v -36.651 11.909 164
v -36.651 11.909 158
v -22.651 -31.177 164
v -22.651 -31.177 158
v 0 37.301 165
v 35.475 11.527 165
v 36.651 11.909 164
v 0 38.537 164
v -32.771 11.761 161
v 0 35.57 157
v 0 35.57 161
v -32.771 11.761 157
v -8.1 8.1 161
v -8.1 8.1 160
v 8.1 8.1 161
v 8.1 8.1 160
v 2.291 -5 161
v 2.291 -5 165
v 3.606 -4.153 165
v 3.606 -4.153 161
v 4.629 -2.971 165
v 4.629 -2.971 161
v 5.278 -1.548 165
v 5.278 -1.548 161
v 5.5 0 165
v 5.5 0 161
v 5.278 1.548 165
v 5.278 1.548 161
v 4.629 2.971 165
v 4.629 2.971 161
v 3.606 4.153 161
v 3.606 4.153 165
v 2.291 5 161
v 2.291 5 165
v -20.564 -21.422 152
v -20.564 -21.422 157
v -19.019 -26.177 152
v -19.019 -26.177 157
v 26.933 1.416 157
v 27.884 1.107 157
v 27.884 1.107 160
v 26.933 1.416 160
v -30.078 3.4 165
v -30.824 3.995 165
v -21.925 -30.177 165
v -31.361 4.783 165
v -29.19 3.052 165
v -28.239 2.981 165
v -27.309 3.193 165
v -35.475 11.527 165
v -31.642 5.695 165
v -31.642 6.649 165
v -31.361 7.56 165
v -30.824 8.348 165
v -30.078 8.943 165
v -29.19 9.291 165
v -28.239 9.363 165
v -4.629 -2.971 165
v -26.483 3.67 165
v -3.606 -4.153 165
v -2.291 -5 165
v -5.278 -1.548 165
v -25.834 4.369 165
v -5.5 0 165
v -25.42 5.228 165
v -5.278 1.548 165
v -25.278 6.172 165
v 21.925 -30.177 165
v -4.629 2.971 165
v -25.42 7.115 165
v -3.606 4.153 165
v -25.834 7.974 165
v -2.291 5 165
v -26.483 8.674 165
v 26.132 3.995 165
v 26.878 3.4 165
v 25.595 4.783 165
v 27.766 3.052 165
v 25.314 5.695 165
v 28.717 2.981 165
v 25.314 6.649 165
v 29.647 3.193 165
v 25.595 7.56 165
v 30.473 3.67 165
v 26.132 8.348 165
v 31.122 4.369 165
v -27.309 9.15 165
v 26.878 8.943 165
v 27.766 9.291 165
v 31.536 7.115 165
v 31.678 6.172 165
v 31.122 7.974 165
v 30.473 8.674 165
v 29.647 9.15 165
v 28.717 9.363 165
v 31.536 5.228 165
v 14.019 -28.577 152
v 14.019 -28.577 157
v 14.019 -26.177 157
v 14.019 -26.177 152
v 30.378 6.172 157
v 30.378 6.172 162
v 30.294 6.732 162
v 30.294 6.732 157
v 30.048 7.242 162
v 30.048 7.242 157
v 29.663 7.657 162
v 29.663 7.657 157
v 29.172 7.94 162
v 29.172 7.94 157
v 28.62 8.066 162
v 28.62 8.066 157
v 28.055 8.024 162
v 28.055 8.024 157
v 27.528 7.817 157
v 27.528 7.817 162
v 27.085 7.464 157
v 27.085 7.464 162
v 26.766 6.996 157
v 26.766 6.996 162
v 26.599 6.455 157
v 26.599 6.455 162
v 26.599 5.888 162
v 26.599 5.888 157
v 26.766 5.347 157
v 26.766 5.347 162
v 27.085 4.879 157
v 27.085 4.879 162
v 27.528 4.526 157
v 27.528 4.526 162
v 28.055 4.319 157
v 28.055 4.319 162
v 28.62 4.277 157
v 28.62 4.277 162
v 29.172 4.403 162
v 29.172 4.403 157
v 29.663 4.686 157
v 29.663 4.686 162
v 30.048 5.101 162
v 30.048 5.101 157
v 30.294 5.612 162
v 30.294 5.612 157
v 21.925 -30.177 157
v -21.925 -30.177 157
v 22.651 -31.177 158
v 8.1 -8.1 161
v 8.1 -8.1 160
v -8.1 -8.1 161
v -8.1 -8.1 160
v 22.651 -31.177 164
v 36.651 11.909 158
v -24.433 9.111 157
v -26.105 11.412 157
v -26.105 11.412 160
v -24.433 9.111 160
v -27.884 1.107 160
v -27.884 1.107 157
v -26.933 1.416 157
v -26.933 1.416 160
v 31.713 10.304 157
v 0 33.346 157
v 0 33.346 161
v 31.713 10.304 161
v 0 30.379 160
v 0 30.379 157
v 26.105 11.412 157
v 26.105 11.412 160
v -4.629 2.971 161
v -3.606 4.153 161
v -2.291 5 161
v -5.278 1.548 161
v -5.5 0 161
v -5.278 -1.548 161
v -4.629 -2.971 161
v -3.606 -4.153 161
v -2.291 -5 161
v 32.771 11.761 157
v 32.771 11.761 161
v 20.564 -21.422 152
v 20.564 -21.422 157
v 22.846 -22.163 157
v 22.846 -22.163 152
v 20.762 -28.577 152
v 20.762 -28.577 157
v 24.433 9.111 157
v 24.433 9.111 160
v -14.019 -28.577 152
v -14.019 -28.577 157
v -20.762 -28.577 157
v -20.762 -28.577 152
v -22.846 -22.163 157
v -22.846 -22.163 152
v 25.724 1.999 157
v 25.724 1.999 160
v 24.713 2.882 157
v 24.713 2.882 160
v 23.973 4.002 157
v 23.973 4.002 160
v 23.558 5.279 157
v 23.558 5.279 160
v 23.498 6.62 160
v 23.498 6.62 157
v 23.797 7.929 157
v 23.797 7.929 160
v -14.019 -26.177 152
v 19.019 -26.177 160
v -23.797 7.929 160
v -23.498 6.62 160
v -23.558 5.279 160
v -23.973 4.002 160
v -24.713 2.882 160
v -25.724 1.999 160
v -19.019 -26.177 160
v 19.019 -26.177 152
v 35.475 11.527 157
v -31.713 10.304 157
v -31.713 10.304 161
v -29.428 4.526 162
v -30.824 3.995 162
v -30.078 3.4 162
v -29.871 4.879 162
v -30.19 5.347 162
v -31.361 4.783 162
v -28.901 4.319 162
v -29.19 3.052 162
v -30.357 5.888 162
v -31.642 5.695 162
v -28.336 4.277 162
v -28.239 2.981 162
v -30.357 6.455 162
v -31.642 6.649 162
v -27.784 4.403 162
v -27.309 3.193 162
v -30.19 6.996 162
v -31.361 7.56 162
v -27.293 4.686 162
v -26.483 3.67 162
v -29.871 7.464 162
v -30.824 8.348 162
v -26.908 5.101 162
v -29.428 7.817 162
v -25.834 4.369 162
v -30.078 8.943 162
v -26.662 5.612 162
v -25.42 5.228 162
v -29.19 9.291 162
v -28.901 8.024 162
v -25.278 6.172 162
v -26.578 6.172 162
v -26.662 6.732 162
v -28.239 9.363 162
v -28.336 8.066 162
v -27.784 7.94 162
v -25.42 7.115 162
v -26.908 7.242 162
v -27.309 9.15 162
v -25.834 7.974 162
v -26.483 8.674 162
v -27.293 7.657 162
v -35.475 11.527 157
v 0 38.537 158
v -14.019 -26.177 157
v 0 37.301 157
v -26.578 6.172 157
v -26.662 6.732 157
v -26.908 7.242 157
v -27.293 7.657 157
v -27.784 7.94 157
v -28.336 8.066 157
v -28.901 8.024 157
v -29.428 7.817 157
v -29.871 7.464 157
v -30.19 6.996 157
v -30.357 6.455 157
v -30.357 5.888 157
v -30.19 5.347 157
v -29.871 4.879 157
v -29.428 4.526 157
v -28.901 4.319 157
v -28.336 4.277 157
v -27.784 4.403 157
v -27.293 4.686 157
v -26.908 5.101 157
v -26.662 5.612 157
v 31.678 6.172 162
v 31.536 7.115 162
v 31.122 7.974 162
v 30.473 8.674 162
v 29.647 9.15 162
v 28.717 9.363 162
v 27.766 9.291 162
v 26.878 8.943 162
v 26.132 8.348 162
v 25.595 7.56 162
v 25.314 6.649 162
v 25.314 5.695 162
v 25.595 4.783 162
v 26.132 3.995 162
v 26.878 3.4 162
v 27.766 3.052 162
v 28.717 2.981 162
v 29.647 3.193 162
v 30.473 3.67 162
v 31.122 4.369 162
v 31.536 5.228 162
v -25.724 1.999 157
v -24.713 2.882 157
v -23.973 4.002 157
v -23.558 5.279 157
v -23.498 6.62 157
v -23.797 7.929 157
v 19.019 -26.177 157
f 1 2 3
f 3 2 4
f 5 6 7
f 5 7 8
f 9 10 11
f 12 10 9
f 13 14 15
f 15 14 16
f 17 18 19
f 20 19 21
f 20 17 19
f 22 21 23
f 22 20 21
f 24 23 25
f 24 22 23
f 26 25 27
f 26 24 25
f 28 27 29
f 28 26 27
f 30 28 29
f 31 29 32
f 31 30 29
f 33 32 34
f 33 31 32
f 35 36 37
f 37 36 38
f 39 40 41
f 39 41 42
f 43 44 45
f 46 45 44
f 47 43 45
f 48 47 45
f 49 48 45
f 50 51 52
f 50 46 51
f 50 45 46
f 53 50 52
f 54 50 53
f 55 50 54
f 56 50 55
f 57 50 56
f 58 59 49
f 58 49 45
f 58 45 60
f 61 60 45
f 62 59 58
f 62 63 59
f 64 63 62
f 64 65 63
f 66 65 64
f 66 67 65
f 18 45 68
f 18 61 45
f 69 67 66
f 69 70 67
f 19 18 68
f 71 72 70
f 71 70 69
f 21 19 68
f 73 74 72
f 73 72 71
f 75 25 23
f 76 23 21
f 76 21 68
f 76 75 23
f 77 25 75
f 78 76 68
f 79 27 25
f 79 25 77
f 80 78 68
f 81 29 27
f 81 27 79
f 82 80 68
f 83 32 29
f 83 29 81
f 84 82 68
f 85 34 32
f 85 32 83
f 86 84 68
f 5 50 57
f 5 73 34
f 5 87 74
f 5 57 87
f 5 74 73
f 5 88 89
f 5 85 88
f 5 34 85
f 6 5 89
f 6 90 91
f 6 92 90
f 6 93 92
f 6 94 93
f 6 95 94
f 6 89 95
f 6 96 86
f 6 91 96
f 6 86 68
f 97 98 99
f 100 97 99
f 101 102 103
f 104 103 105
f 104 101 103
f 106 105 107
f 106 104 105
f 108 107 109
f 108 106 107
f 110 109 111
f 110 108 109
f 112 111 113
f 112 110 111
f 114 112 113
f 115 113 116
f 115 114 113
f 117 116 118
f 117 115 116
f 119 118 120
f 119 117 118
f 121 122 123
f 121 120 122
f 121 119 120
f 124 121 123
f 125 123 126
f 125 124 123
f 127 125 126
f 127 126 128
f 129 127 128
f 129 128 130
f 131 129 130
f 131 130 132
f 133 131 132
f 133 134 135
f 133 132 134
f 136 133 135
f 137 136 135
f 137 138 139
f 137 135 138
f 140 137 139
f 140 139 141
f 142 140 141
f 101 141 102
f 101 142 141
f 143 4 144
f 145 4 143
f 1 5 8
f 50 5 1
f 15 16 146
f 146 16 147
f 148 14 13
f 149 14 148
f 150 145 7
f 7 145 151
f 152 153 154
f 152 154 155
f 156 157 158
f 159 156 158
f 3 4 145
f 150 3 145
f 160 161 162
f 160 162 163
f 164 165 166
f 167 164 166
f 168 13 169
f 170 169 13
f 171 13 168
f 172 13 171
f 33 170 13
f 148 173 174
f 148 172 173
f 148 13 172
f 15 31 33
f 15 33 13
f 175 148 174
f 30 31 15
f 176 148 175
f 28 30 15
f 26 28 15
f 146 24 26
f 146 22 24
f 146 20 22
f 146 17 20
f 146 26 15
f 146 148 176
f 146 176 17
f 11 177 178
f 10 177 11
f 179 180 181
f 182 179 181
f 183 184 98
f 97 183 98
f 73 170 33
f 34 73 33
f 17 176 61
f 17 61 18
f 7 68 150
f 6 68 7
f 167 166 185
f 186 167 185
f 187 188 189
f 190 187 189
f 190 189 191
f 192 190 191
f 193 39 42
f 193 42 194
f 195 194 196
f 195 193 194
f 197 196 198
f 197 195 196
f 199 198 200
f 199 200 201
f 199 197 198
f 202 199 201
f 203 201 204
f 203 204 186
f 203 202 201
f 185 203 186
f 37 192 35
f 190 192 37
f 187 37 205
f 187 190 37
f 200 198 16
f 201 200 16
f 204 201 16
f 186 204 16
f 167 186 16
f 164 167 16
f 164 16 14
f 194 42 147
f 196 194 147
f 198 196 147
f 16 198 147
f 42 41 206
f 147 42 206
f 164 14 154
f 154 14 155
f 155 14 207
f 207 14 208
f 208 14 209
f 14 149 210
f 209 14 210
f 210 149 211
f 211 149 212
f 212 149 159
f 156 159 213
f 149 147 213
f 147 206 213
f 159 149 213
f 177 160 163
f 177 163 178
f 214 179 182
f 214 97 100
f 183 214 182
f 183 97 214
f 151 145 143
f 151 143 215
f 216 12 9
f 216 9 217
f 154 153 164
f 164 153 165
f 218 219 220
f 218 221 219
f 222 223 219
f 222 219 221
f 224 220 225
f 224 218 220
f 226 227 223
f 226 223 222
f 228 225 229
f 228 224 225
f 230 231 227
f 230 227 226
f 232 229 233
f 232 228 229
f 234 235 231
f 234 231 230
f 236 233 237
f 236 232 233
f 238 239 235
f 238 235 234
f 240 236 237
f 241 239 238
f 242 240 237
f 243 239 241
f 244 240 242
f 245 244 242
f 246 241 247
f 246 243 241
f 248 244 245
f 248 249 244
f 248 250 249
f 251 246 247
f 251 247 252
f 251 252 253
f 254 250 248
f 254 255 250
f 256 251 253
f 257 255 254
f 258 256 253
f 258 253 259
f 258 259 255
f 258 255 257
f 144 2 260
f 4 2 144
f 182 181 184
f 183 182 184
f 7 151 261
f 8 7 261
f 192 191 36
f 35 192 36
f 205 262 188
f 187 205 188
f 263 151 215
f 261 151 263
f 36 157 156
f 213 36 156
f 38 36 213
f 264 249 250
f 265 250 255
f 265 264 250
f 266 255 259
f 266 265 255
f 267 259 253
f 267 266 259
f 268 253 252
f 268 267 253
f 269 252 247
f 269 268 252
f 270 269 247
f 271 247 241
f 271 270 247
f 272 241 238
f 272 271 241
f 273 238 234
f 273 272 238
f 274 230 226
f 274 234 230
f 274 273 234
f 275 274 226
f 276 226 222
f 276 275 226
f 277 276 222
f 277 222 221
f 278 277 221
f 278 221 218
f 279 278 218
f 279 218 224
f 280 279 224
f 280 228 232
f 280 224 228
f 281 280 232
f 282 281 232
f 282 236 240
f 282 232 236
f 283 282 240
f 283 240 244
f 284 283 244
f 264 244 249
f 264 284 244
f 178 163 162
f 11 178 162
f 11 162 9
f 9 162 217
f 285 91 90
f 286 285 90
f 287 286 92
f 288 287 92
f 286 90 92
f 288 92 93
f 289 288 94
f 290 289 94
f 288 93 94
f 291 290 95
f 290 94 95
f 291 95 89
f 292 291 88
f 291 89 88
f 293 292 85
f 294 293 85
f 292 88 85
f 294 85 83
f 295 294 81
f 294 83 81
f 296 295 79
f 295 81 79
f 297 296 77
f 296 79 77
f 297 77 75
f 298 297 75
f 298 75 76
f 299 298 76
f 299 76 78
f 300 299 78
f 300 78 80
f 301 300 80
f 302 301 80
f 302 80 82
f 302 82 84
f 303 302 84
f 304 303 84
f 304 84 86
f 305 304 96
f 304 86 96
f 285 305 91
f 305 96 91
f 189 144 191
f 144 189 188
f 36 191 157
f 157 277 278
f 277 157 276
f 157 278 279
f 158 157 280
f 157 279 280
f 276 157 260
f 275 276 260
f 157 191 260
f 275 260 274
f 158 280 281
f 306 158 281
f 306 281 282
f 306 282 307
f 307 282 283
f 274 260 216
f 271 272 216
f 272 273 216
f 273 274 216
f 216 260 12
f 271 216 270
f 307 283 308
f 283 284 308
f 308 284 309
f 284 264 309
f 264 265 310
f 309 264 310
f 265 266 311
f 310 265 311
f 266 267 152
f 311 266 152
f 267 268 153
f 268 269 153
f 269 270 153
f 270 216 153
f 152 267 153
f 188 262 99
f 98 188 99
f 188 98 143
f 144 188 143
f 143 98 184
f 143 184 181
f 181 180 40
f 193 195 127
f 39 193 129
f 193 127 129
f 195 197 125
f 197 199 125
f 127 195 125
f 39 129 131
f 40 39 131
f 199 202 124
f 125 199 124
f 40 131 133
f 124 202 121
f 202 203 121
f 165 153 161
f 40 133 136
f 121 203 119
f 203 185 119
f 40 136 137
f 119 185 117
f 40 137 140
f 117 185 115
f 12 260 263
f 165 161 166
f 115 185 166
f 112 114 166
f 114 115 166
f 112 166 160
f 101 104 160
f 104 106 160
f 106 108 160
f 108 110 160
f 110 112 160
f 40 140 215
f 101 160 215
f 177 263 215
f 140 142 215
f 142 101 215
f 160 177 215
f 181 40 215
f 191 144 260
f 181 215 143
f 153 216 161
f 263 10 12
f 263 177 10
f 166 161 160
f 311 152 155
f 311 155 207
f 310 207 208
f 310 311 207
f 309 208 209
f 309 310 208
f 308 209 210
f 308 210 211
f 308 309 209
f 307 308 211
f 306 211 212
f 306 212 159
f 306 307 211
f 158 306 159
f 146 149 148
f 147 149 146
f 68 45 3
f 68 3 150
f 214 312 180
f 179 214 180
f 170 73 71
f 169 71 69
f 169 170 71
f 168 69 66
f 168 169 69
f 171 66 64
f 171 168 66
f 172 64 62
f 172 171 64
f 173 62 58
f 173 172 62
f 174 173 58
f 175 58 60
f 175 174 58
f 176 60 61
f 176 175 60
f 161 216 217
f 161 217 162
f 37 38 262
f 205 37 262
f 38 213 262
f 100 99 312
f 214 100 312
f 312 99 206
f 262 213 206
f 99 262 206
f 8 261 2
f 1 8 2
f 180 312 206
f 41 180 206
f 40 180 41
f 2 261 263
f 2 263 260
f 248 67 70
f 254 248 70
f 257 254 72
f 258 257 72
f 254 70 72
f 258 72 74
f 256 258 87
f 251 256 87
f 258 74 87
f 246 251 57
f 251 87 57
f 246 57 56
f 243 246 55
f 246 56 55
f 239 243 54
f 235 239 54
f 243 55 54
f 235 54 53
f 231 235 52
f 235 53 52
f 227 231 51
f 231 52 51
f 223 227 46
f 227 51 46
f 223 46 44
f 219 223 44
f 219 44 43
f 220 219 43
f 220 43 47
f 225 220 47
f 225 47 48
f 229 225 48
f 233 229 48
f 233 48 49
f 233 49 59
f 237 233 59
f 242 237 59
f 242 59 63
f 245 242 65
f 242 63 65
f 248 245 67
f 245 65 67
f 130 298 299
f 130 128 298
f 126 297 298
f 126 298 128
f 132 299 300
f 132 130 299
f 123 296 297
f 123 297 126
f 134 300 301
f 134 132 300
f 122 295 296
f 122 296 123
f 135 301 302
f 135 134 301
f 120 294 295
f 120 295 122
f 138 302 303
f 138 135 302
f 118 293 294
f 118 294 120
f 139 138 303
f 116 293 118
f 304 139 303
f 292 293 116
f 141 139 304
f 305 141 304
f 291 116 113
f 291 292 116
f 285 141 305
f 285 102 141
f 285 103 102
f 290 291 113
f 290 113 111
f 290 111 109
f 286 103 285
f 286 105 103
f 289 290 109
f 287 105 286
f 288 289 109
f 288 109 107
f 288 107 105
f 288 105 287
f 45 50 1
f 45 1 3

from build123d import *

# Parameters (mm, degrees)
SKETCH017_R     = 1.9
PAD007_DEPTH    = 8
POCKET010_DEPTH = 3
POCKET011_DEPTH = 4
SKETCH021_W     = 16.2
SKETCH021_H     = 16.2
POCKET012_DEPTH = 1
SKETCH022_R     = 3.2
POCKET013_DEPTH = 3
PAD008_DEPTH    = 5
CHAMFER005_SIZE = 1


with BuildPart() as part:
    # Sketch017 (on Face1 of ShapeBinder001) → Pad007 (new body)
    with BuildSketch(Plane.XY.offset(157)):
        Polygon((0, 38.536997), (-36.650862, 11.908587), (-22.651479, -31.177086), (22.651479, -31.177086), (36.650862, 11.908587), align=None)
        with Locations((-28.478046, 6.171653)):
            Circle(SKETCH017_R, mode=Mode.SUBTRACT)
        with Locations((28.478046, 6.171653)):
            Circle(SKETCH017_R, mode=Mode.SUBTRACT)
        with BuildLine():
            ThreePointArc((-2.291288, 5), (-5.5, 0), (-2.291288, -5))
            Line((-2.291288, -5), (2.291288, -5))
            ThreePointArc((2.291288, -5), (5.5, 0), (2.291288, 5))
            Line((-2.291288, 5), (2.291288, 5))
        make_face(mode=Mode.SUBTRACT)
    extrude(amount=PAD007_DEPTH)

    # Sketch019 (on Face12 of Pad007) → Pocket010 (cut)
    with BuildSketch(Plane(origin=(0, 0, 157), x_dir=(1, 0, 0), z_dir=(0, 0, -1))):
        with BuildLine():
            Line((-27.884018, -1.107353), (-19.018766, 26.177086))
            Line((-19.018766, 26.177086), (19.018766, 26.177086))
            Line((19.018766, 26.177086), (27.884018, -1.107353))
            Line((27.884018, -1.107353), (26.932961, -1.41637))
            ThreePointArc((26.932961, -1.41637), (23.722763, -4.626568), (24.432961, -9.110579))
            Line((26.105291, -11.412344), (24.432961, -9.110579))
            Line((0, -30.378949), (26.105291, -11.412344))
            Line((-26.105291, -11.412344), (0, -30.378949))
            Line((-26.105291, -11.412344), (-24.432961, -9.110579))
            ThreePointArc((-24.432961, -9.110579), (-23.722763, -4.626568), (-26.932961, -1.41637))
            Line((-27.884018, -1.107353), (-26.932961, -1.41637))
        make_face()
    extrude(amount=-POCKET010_DEPTH, mode=Mode.SUBTRACT)

    # CopySketch020 → Pocket011 (cut)
    with BuildSketch(Plane(origin=(0, 0, 157), x_dir=(1, 0, 0), z_dir=(0, 0, -1))):
        Polygon((-31.713466, -10.30433), (0, -33.345512), (31.713466, -10.30433), (32.77148, -11.76056), (0, -35.570434), (-32.77148, -11.76056), align=None)
    extrude(amount=-POCKET011_DEPTH, mode=Mode.SUBTRACT)

    # Sketch021 (on Face31 of Pocket011) → Pocket012 (cut)
    with BuildSketch(Plane(origin=(0, 0, 160), x_dir=(1, 0, 0), z_dir=(0, 0, -1))):
        Rectangle(SKETCH021_W, SKETCH021_H)
    extrude(amount=-POCKET012_DEPTH, mode=Mode.SUBTRACT)

    # Sketch022 (on Face5 of Pocket012) → Pocket013 (cut)
    with BuildSketch(Plane.XY.offset(165)):
        with Locations((-28.478046, 6.171653)):
            Circle(SKETCH022_R)
        with Locations((28.478046, 6.171653)):
            Circle(SKETCH022_R)
    extrude(amount=-POCKET013_DEPTH, mode=Mode.SUBTRACT)

    # Sketch023 (on Face4 of Pocket013) → Pad008 (join)
    with BuildSketch(Plane(origin=(0, 0, 157), x_dir=(1, 0, 0), z_dir=(0, 0, -1))):
        Polygon((-20.563851, 21.421803), (-19.018766, 26.177086), (-14.018766, 26.177086), (-14.018766, 28.577086), (-20.762468, 28.577086), (-22.846387, 22.163444), align=None)
        Polygon((14.018766, 26.177086), (19.018766, 26.177086), (20.563851, 21.421803), (22.846387, 22.163444), (20.762468, 28.577086), (14.018766, 28.577086), align=None)
    extrude(amount=PAD008_DEPTH)

    # Chamfer005
    chamfer005_edges = [part.edges().sort_by_distance(p)[0] for p in [
        (18.325431, 25.222792, 157),
        (-18.325431, 25.222792, 157),
        (29.65117, -9.634249, 157),
        (0, -31.177086, 157),
        (-29.65117, -9.634249, 157),
        (18.325431, 25.222792, 165),
        (29.65117, -9.634249, 165),
        (-18.325431, 25.222792, 165),
        (-29.65117, -9.634249, 165),
        (0, -31.177086, 165),
    ]]
    chamfer(chamfer005_edges, length=CHAMFER005_SIZE)


solid = part.part
